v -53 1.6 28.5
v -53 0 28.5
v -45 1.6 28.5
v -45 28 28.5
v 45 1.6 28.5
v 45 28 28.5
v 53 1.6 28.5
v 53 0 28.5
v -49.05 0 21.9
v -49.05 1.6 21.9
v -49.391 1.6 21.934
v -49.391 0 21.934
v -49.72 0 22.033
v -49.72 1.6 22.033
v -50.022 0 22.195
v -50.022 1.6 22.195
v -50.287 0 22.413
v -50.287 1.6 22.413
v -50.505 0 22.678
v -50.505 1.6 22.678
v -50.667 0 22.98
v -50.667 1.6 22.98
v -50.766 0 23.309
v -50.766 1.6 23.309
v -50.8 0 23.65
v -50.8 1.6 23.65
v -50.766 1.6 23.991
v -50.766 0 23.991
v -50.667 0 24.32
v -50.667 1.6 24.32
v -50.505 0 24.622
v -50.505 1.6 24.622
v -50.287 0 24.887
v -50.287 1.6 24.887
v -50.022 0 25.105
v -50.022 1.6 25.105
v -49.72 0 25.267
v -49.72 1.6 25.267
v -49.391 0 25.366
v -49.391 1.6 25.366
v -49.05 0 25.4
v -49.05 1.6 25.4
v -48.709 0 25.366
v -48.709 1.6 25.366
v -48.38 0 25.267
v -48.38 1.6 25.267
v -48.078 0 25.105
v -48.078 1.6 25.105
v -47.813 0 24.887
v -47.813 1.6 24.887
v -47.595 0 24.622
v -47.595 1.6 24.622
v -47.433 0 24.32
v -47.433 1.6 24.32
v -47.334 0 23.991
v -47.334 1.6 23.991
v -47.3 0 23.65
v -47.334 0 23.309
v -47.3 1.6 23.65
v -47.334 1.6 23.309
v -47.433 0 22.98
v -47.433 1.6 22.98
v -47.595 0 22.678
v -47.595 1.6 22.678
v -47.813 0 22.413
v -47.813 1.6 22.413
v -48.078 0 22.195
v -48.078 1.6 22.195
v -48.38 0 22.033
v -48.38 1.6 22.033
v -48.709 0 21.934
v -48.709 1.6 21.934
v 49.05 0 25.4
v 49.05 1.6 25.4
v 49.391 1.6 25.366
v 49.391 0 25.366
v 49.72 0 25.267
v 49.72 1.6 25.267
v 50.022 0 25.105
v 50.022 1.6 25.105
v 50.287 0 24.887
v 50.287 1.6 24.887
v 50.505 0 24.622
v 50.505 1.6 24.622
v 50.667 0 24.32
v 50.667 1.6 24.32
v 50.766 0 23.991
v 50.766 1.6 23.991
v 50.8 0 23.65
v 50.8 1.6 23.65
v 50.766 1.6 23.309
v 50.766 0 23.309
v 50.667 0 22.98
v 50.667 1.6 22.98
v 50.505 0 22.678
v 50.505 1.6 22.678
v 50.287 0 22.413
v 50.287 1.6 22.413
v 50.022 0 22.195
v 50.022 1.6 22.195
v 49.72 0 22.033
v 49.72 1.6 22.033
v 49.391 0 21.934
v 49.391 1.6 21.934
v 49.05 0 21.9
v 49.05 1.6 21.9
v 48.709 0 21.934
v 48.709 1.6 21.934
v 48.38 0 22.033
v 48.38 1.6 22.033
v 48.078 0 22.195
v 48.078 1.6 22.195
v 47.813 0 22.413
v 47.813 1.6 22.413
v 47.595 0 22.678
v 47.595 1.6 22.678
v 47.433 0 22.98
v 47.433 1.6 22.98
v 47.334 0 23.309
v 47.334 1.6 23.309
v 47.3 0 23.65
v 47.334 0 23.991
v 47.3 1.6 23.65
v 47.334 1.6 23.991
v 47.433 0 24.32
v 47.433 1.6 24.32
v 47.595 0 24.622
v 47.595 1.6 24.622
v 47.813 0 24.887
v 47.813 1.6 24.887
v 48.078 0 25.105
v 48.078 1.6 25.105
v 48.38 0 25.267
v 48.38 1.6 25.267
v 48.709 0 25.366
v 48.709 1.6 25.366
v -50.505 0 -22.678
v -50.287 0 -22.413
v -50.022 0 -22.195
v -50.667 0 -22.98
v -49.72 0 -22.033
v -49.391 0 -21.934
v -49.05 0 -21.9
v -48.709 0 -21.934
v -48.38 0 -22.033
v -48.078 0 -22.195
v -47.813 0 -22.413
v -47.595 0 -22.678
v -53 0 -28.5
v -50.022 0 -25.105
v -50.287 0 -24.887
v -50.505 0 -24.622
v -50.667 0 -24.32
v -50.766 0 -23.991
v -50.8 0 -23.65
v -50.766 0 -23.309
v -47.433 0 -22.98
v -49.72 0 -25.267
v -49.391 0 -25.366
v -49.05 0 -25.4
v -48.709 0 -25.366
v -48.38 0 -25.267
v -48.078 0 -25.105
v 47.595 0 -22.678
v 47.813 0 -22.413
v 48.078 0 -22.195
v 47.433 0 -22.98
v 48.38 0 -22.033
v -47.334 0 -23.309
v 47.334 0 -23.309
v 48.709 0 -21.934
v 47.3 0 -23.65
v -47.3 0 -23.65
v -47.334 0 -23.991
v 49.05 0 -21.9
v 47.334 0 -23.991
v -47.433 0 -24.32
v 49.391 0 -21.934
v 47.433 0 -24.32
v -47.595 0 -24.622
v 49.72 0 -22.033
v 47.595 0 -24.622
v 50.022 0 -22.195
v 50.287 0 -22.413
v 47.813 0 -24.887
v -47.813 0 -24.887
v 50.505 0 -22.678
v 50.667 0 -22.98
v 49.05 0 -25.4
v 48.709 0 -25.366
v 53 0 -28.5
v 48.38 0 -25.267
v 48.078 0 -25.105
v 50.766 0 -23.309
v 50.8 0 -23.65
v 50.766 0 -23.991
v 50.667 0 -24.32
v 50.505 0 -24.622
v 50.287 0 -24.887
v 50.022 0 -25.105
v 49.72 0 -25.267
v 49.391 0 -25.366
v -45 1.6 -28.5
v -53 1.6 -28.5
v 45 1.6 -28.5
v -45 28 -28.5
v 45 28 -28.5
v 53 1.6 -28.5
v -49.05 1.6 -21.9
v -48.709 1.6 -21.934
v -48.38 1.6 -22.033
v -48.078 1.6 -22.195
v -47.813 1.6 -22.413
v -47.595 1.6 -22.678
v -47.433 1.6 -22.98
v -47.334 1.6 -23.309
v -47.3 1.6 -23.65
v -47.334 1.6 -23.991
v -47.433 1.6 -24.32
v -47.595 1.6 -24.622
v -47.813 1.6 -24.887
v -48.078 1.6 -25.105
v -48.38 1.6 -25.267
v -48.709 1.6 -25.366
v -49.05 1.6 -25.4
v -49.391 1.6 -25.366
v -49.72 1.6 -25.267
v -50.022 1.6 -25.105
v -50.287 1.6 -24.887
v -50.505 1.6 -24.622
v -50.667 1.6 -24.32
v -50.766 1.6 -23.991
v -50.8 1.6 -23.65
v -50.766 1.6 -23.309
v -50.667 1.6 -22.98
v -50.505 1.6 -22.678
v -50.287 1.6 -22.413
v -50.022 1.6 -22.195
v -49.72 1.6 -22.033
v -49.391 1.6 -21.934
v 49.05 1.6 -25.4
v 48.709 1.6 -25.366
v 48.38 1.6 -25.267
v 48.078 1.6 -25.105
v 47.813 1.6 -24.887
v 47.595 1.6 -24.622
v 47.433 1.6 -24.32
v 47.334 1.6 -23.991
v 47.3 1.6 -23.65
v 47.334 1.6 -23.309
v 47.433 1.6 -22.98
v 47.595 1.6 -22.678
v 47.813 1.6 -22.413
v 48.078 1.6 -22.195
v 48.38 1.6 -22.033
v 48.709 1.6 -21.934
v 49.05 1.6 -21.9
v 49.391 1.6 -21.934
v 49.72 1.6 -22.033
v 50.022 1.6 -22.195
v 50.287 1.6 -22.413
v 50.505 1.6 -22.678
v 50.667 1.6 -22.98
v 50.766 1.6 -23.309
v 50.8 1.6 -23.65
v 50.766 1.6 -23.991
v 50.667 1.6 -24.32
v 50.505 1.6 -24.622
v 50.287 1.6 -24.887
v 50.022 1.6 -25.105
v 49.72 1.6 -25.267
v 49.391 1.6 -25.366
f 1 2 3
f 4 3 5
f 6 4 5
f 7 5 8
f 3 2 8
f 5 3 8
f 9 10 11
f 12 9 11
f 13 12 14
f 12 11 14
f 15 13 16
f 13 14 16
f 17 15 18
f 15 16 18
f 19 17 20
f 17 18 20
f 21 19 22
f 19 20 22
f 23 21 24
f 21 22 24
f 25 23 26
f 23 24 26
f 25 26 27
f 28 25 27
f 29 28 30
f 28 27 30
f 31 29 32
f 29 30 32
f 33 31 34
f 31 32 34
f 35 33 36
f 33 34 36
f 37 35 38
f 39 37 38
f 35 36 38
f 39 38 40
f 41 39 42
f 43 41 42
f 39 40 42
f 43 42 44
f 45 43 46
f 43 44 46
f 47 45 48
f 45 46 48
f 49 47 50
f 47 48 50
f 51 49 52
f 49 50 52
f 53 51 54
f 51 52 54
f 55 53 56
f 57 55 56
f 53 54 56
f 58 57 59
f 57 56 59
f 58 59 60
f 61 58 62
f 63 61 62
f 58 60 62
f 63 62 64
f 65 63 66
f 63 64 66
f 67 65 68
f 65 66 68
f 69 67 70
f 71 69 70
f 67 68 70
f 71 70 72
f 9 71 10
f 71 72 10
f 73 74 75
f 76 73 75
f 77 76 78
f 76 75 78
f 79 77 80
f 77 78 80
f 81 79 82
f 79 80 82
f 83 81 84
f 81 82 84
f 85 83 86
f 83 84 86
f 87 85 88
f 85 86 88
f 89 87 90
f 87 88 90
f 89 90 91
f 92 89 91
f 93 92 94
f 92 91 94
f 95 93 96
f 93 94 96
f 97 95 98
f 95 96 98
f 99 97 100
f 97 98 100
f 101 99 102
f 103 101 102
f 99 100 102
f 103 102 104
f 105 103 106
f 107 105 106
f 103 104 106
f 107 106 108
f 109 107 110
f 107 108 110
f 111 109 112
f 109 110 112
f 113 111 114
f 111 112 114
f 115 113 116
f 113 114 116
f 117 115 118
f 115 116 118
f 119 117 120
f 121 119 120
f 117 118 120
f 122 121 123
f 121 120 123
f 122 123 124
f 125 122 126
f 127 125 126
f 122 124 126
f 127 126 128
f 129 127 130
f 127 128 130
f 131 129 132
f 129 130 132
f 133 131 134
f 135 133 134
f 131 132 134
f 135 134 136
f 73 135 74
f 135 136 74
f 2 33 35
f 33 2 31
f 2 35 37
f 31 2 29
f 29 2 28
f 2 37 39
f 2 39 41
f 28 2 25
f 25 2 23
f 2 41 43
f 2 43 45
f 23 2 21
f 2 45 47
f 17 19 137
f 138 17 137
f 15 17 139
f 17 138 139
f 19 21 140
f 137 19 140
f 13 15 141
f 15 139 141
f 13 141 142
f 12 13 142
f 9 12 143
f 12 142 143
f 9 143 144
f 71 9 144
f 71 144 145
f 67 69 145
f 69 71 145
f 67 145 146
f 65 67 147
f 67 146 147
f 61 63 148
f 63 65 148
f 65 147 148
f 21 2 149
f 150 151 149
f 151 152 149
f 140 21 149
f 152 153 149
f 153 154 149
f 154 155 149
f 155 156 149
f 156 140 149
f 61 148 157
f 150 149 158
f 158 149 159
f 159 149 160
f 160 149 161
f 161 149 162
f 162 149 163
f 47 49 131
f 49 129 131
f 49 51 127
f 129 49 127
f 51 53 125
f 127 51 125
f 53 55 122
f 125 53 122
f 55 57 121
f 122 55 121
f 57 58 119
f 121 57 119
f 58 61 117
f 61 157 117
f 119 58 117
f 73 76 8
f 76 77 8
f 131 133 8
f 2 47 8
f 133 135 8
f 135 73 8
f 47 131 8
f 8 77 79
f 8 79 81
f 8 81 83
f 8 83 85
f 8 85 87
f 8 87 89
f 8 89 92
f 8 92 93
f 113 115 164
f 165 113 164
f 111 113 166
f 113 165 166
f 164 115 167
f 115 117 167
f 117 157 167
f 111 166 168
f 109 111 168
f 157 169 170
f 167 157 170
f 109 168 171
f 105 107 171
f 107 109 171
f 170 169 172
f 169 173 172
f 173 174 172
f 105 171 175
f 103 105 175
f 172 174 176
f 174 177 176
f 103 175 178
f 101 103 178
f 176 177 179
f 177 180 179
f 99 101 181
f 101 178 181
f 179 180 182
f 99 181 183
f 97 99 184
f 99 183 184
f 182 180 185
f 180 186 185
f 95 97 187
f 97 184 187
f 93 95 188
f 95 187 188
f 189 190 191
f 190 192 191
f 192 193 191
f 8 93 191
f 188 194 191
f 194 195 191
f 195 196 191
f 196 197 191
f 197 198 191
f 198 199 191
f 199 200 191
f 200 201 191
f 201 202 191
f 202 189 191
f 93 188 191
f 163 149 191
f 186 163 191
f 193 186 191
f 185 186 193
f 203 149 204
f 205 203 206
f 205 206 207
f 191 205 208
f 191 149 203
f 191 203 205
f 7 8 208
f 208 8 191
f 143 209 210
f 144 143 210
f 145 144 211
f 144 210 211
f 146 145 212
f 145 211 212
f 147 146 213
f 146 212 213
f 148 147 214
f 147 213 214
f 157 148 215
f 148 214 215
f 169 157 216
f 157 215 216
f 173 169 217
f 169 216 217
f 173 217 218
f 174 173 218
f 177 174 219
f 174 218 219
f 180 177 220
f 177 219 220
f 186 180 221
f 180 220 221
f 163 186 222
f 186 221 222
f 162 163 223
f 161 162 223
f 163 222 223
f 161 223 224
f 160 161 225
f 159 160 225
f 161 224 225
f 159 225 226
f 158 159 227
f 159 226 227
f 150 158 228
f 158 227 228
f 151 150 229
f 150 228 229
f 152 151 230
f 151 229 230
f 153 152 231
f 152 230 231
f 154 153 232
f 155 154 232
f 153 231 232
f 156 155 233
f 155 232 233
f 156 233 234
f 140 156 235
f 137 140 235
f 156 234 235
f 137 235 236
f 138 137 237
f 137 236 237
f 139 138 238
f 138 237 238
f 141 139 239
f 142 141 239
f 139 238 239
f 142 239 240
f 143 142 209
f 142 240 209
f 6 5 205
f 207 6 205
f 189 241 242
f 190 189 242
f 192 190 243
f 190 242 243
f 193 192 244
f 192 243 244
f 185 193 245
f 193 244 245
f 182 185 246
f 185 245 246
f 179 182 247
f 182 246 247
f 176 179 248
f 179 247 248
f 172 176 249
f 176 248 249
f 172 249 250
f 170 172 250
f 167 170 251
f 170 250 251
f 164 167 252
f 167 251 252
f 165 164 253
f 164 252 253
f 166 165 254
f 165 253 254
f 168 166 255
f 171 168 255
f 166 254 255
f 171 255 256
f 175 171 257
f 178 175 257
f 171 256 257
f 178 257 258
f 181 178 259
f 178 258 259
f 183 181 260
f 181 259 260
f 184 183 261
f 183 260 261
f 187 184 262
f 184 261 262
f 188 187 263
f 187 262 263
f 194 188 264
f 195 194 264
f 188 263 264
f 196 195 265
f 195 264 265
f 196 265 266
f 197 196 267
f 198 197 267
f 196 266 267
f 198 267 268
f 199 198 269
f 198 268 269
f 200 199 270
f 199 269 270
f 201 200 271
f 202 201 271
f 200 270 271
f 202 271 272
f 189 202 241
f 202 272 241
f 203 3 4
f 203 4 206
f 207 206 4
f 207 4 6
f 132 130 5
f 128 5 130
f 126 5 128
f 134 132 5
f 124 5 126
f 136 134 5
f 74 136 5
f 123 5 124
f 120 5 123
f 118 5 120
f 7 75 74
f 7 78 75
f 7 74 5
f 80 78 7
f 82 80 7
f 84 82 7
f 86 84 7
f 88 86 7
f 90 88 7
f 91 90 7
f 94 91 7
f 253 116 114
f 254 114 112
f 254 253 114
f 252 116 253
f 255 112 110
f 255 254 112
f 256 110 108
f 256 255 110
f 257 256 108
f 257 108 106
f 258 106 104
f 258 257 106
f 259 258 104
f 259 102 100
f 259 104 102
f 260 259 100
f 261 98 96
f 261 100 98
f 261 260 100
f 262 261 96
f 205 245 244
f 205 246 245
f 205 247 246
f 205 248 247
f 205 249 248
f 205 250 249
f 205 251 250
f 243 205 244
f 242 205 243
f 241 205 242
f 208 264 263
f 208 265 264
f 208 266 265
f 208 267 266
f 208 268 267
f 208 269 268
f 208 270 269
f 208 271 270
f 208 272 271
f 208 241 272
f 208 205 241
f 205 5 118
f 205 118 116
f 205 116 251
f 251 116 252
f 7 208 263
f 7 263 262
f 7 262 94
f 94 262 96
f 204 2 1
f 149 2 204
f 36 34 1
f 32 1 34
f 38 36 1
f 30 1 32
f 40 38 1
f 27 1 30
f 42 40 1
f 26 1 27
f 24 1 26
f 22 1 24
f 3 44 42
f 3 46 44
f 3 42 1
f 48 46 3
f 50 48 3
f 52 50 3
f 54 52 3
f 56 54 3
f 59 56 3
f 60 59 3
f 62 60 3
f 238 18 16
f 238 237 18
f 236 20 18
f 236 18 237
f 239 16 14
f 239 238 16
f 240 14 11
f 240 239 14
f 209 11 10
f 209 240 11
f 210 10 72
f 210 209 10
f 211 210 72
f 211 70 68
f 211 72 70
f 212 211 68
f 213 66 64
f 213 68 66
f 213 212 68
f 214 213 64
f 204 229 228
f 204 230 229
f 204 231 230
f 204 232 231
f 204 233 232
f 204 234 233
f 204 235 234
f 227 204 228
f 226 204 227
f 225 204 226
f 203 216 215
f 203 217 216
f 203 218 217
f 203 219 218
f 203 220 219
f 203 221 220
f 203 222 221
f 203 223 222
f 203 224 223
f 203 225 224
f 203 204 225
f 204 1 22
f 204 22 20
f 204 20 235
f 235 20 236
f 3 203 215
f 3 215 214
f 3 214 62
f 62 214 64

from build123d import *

# Parameters (mm, degrees)
SKETCH_1_W          = 106
SKETCH_1_H          = 57
EXTRUDE_1_DEPTH     = 1.6
SKETCH_2_R          = 1.75
CUT_EXTRUDE_1_DEPTH = 1.6
SKETCH_3_W          = 90
SKETCH_3_H          = 57
EXTRUDE_2_DEPTH     = 26.4


with BuildPart() as part:
    # 草图1 → 凸台-拉伸1 (new body)
    with BuildSketch(Plane(origin=(0, 0, 0), x_dir=(1, 0, 0), z_dir=(0, 1, 0))):
        Rectangle(SKETCH_1_W, SKETCH_1_H)
    extrude(amount=EXTRUDE_1_DEPTH)

    # 草图2 → 切除-拉伸1 (cut)
    with BuildSketch(Plane(origin=(0, 1.6, 0), x_dir=(1, 0, 0), z_dir=(0, 1, 0))):
        with Locations(Location((-49.05, 23.65, 0), (0, 0, 270))):
            Circle(SKETCH_2_R)
        with Locations(Location((-49.05, -23.65, 0), (0, 0, 90))):
            Circle(SKETCH_2_R)
        with Locations(Location((49.05, -23.65, 0), (0, 0, 270))):
            Circle(SKETCH_2_R)
        with Locations(Location((49.05, 23.65, 0), (0, 0, 90))):
            Circle(SKETCH_2_R)
    extrude(amount=-CUT_EXTRUDE_1_DEPTH, mode=Mode.SUBTRACT)

    # 草图3 → 凸台-拉伸2 (add)
    with BuildSketch(Plane(origin=(0, 1.6, 0), x_dir=(1, 0, 0), z_dir=(0, 1, 0))):
        Rectangle(SKETCH_3_W, SKETCH_3_H)
    extrude(amount=EXTRUDE_2_DEPTH)


solid = part.part
